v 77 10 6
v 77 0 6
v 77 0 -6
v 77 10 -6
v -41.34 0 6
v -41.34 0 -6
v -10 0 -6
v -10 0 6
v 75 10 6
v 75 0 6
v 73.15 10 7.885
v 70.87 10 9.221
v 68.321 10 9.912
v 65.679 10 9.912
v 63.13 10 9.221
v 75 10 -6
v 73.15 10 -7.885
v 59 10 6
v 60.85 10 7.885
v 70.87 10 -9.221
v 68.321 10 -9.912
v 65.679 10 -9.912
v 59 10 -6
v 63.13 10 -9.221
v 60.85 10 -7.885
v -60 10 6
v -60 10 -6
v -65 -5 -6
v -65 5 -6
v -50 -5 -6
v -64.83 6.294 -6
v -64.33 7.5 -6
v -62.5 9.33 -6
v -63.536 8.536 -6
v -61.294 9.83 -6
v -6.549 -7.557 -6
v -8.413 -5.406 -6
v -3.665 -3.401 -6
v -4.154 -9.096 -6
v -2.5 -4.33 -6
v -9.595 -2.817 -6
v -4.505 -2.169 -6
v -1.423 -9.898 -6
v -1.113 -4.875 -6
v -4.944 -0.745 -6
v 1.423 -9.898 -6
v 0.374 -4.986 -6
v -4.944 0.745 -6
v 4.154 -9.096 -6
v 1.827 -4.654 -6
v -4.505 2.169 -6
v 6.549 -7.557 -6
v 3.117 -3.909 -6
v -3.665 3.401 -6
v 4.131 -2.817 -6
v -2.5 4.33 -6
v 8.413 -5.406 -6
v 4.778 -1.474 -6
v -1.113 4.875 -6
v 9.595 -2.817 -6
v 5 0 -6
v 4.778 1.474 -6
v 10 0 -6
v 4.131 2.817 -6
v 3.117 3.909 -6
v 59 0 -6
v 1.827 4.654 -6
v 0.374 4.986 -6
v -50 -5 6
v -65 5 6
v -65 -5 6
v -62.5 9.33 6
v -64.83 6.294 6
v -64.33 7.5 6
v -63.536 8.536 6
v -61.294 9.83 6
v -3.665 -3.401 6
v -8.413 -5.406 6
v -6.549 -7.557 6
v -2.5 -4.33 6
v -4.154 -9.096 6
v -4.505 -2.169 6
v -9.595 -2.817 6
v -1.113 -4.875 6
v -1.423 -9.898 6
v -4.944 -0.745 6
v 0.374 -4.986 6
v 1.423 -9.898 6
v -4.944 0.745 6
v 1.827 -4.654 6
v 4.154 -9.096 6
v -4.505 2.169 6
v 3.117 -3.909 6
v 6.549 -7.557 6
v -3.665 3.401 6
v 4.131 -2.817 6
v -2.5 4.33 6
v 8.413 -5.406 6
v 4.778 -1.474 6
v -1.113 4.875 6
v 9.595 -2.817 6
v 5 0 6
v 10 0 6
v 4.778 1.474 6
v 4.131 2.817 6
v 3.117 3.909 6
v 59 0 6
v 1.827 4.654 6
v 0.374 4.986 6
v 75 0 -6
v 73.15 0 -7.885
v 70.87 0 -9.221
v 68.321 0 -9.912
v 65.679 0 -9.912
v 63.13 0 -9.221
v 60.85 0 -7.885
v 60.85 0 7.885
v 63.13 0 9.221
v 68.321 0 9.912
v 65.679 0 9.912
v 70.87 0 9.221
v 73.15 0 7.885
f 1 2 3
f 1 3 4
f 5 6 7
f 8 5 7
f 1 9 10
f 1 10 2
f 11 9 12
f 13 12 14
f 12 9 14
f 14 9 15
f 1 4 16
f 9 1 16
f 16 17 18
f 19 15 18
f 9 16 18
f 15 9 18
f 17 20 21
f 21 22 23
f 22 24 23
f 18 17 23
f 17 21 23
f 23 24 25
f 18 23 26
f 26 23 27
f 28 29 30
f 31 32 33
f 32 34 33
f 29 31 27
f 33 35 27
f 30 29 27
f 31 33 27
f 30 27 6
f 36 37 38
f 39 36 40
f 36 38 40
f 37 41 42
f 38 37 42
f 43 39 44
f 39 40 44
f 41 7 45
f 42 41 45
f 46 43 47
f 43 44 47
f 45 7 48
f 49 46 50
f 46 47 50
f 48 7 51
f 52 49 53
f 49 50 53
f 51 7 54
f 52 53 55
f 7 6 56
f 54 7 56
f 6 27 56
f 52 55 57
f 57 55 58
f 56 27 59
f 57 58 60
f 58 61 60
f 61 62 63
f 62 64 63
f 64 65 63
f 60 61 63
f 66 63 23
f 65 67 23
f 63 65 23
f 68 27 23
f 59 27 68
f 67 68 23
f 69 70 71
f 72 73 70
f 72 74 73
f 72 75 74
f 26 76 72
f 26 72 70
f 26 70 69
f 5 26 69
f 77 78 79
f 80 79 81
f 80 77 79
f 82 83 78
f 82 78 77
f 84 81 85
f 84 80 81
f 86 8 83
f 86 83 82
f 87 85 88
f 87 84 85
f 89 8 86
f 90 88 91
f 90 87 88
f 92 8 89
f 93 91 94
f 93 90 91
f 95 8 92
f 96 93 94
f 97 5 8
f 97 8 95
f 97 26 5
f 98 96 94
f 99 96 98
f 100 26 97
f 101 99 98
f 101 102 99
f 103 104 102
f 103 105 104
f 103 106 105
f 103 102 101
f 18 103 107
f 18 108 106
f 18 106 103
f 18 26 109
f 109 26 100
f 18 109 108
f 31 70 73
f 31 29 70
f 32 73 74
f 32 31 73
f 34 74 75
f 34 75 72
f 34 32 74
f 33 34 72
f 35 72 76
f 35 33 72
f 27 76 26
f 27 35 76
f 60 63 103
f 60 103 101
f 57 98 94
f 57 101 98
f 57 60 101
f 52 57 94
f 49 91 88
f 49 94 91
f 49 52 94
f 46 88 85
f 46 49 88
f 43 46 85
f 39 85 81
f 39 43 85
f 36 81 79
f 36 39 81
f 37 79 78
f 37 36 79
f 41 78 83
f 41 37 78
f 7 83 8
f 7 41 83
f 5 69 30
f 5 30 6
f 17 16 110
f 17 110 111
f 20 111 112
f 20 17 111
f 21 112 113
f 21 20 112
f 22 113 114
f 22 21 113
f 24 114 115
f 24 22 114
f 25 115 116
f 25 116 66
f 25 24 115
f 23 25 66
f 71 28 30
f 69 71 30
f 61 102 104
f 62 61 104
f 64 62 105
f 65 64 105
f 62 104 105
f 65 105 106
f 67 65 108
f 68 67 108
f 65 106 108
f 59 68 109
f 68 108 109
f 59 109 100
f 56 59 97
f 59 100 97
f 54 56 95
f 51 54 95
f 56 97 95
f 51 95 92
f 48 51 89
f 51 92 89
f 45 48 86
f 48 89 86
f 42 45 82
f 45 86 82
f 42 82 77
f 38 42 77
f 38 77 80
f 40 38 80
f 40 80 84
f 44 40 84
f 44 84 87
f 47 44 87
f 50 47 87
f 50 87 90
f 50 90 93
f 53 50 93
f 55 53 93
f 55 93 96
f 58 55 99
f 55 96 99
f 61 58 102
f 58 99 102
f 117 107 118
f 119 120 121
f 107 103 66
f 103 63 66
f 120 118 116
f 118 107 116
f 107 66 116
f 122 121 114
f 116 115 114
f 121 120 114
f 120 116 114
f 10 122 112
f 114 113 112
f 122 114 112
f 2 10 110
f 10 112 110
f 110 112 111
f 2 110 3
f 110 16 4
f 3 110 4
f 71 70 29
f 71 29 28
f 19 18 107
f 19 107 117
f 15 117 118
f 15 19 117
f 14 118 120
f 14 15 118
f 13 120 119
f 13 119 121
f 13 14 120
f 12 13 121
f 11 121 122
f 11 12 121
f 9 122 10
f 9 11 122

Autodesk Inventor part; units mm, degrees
ref_plane "YZ Plane" through (0, 0, 0) normal (1, 0, 0) x (0, 1, 0)
ref_plane "XZ Plane" through (0, 0, 0) normal (0, 1, 0) x (-1, 0, 0)
ref_plane "XY Plane" through (0, 0, 0) normal (0, 0, 1) x (1, 0, 0)
sketch "Esboço1" plane through (0, 0, 0) normal (0, 0, 1) x (1, 0, 0)
  arc A0 (-10, 0) -> (10, 0) centre (0, 0) ccw
  line L0 (10, 0) -> (77, 0)
  line L1 (77, 0) -> (77, 10)
  line L2 (77, 10) -> (-65, 10)
  line L3 (-65, 10) -> (-65, -5)
  line L4 (-65, -5) -> (-50, -5)
  line L5 (-50, -5) -> (-41.3397, 0)
  line L6 (-41.3397, 0) -> (-10, 0)
  dimension "d0" = 20
  dimension "d1" = 142
  dimension "d2" = 77
  dimension "d3" = 15
  dimension "d4" = 30
  dimension "d5" = 10
  dimension "d6" = 15
extrude "Extrusão1" add sketch "Esboço1" along normal mid plane 12
fillet "Arredondamento1" radius 5 1 edges at (-65, 10, 0)
sketch "Esboço2" plane through (0, 0, 6) normal (0, 0, 1) x (1, 0, 0)
  circle A0 centre (0, 0) radius 5
  dimension "d10" = 10
extrude "Extrusão2" cut sketch "Esboço2" against normal through all
sketch "Esboço3" plane through (77, 10, 6) normal (0, 1, 0) x (1, 0, 0)
  circle A0 centre (-10, 6) radius 10
  line L0 (0, 12) -> (0, 0) projected
  line L1 (-137, 0) -> (-137, 12) projected
  point P0 (-77, 6)
  point P1 (-137, 6)
  dimension "d13" = 20
  dimension "d14" = 10
extrude "Extrusão3" add sketch "Esboço3" against normal blind 10
properties material "Liga de aço"
